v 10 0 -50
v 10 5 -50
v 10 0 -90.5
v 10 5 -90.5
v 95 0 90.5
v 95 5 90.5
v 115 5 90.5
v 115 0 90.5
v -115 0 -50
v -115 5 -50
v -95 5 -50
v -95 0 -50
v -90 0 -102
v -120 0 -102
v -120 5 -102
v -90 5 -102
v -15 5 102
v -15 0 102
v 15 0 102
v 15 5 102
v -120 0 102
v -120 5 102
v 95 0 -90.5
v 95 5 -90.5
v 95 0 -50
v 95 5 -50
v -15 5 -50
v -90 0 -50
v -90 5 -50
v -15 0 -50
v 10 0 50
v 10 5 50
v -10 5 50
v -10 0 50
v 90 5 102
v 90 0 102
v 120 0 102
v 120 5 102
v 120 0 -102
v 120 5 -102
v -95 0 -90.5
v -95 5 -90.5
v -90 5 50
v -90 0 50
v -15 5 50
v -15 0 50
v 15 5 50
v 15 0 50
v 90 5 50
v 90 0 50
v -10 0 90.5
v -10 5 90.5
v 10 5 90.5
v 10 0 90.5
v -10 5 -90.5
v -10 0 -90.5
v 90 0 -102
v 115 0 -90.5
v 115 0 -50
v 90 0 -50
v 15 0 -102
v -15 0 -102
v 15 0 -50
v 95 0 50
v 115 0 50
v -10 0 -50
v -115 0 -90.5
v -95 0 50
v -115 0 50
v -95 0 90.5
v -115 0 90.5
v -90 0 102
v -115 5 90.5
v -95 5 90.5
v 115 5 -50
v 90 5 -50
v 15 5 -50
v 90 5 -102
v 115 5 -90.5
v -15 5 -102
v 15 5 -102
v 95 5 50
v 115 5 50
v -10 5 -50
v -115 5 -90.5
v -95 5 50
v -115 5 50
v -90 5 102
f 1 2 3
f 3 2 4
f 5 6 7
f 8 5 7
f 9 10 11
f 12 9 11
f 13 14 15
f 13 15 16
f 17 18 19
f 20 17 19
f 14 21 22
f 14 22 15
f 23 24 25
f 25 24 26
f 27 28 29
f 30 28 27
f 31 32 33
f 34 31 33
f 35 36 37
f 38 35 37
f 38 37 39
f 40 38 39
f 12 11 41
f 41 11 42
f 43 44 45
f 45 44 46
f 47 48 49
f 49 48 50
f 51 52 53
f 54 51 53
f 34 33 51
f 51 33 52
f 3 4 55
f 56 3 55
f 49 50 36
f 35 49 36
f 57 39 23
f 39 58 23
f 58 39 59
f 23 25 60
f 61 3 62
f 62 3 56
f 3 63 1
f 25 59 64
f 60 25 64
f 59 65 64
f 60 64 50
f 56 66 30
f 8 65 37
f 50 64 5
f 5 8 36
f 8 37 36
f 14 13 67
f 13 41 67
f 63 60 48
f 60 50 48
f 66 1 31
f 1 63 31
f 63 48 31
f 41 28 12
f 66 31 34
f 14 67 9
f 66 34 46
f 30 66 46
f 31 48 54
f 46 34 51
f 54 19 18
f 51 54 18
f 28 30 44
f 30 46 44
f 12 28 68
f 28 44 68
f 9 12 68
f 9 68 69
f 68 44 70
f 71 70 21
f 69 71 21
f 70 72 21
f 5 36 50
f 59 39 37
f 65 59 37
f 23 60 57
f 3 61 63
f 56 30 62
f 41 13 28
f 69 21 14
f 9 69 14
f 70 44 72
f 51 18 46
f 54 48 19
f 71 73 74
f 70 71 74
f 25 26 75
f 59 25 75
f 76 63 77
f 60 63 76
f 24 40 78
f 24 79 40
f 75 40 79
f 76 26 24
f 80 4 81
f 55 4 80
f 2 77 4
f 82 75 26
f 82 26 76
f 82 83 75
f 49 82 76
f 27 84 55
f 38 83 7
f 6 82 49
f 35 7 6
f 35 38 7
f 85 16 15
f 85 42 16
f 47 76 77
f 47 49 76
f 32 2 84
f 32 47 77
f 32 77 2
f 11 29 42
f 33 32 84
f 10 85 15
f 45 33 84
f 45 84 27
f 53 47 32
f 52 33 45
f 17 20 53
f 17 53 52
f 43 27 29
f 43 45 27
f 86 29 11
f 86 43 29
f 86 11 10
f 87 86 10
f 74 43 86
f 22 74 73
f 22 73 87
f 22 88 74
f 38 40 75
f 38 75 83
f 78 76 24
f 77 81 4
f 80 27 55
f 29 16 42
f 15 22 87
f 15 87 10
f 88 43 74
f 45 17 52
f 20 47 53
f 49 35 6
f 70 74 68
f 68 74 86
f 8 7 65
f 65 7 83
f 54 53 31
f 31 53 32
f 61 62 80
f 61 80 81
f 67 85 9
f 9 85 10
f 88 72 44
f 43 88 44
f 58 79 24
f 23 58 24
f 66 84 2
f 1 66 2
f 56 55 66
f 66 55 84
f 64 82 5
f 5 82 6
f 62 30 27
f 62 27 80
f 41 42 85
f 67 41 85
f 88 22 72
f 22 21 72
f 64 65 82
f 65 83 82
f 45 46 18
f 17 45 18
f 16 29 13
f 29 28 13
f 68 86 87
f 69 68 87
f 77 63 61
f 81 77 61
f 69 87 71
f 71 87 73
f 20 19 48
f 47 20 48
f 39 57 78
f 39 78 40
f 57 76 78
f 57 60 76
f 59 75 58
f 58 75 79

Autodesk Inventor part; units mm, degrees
ref_plane "YZ Plane" through (0, 0, 0) normal (1, 0, 0) x (0, 1, 0)
ref_plane "XZ Plane" through (0, 0, 0) normal (0, 1, 0) x (-1, 0, 0)
ref_plane "XY Plane" through (0, 0, 0) normal (0, 0, 1) x (1, 0, 0)
sketch "Sketch1" plane through (0, 0, 0) normal (0, 1, 0) x (-1, 0, 0)
  line L0 (120, 102) -> (90, 102)
  line L1 (120, -102) -> (90, -102)
  line L2 (120, 102) -> (120, -102)
  line L3 (90, 102) -> (90, 50)
  line L4 (90, -50) -> (90, -102)
  line L5 (90, 50) -> (15, 50)
  line L6 (90, -50) -> (15, -50)
  line L7 (15, 50) -> (15, 102)
  line L8 (15, -50) -> (15, -102)
  line L9 (15, 102) -> (-15, 102)
  line L10 (15, -102) -> (-15, -102)
  line L11 (-15, 102) -> (-15, 50)
  line L12 (-15, -50) -> (-15, -102)
  line L13 (-15, 50) -> (-90, 50)
  line L14 (-15, -50) -> (-90, -50)
  line L15 (-90, 50) -> (-90, 102)
  line L16 (-90, -50) -> (-90, -102)
  line L17 (-90, 102) -> (-120, 102)
  line L18 (-90, -102) -> (-120, -102)
  line L19 (-120, 102) -> (-120, -102)
  line L20 (120, 0) -> (-120, 0) construction
  line L21 (0, 102) -> (0, -102) construction
  point P0 (0, 0)
  point P1 (0, 0)
  dimension "d0" = 204
  dimension "d1" = 30
  dimension "d3" = 75
  dimension "d4" = 52
  dimension "d5" = 100
extrude "Extrusion1" add sketch "Sketch1" along normal blind 5
sketch "Sketch2" plane through (0, 5, 0) normal (0, 1, 0) x (1, 0, 0)
  line L0 (-115, -90.5) -> (-95, -90.5)
  line L1 (-95, -90.5) -> (-95, -50)
  line L2 (-95, -50) -> (-115, -50)
  line L3 (-115, -50) -> (-115, -90.5)
  line L4 (-120, -102) -> (-90, -102) projected
  line L5 (-120, 102) -> (-120, -102) projected
  line L6 (-90, -102) -> (-90, -50) projected
  line L7 (-10, -90.5) -> (10, -90.5)
  line L8 (10, -90.5) -> (10, -50)
  line L9 (10, -50) -> (-10, -50)
  line L10 (-10, -50) -> (-10, -90.5)
  line L11 (95, -90.5) -> (115, -90.5)
  line L12 (115, -90.5) -> (115, -50)
  line L13 (115, -50) -> (95, -50)
  line L14 (95, -50) -> (95, -90.5)
  line L15 (-15, -50) -> (-15, -102) projected
  line L16 (90, -50) -> (90, -102) projected
  line L17 (-115, 50) -> (-95, 50)
  line L18 (-95, 50) -> (-95, 90.5)
  line L19 (-95, 90.5) -> (-115, 90.5)
  line L20 (-115, 90.5) -> (-115, 50)
  line L21 (-10, 50) -> (10, 50)
  line L22 (10, 50) -> (10, 90.5)
  line L23 (10, 90.5) -> (-10, 90.5)
  line L24 (-10, 90.5) -> (-10, 50)
  line L25 (95, 50) -> (115, 50)
  line L26 (115, 50) -> (115, 90.5)
  line L27 (115, 90.5) -> (95, 90.5)
  line L28 (95, 90.5) -> (95, 50)
  line L29 (-90, 102) -> (-120, 102) projected
  line L30 (-90, 50) -> (-90, 102) projected
  line L31 (-15, 102) -> (-15, 50) projected
  line L32 (90, 102) -> (90, 50) projected
  point P0 (0, 0)
  point P1 (-105, 50)
  point P2 (0, 50)
  point P3 (105, 50)
  point P4 (105, 90.5)
  point P5 (0, 90.5)
  point P6 (-105, 90.5)
  dimension "d8" = 11.5
  dimension "d9" = 5
  dimension "d10" = 5
  dimension "d11" = 40.5
  dimension "d12" = 5
  dimension "d13" = 5
  dimension "d14" = 5
  dimension "d15" = 11.5
  dimension "d16" = 5
  dimension "d17" = 40.5
  dimension "d18" = 5
  dimension "d19" = 5
extrude "Extrusion2" cut sketch "Sketch2" against normal up to next
equation "\"d1\" = s_depth + 2 * b_mat_thickness"
equation "\"d3\" = b_leg_space"
equation "\"d4\" = s_land + s_width + b_mat_thickness"
equation "\"d5\" = b_core_width"
equation "\"d6\" = b_mat_thickness"
equation "\"d8\" = b_mat_thickness + s_land"
equation "\"d9\" = b_mat_thickness"
equation "\"d10\" = b_mat_thickness"
equation "\"d11\" = s_width"
equation "\"d12\" = b_mat_thickness"
equation "\"d13\" = b_mat_thickness"
equation "\"d14\" = b_mat_thickness"
equation "\"d15\" = d8"
equation "\"d16\" = b_mat_thickness"
equation "\"d17\" = s_width"
equation "\"d18\" = b_mat_thickness"
equation "\"d19\" = b_mat_thickness"
equation "\"d20\" = 0.5 * b_mat_thickness"
equation "\"s_depth\" = 20"
equation "\"b_mat_thickness\" = 5"
equation "\"b_leg_space\" = 75"
equation "\"s_land\" = 6.5"
equation "\"s_width\" = 40.5"
equation "\"b_core_width\" = 100"
properties part number "Body_bottom"
